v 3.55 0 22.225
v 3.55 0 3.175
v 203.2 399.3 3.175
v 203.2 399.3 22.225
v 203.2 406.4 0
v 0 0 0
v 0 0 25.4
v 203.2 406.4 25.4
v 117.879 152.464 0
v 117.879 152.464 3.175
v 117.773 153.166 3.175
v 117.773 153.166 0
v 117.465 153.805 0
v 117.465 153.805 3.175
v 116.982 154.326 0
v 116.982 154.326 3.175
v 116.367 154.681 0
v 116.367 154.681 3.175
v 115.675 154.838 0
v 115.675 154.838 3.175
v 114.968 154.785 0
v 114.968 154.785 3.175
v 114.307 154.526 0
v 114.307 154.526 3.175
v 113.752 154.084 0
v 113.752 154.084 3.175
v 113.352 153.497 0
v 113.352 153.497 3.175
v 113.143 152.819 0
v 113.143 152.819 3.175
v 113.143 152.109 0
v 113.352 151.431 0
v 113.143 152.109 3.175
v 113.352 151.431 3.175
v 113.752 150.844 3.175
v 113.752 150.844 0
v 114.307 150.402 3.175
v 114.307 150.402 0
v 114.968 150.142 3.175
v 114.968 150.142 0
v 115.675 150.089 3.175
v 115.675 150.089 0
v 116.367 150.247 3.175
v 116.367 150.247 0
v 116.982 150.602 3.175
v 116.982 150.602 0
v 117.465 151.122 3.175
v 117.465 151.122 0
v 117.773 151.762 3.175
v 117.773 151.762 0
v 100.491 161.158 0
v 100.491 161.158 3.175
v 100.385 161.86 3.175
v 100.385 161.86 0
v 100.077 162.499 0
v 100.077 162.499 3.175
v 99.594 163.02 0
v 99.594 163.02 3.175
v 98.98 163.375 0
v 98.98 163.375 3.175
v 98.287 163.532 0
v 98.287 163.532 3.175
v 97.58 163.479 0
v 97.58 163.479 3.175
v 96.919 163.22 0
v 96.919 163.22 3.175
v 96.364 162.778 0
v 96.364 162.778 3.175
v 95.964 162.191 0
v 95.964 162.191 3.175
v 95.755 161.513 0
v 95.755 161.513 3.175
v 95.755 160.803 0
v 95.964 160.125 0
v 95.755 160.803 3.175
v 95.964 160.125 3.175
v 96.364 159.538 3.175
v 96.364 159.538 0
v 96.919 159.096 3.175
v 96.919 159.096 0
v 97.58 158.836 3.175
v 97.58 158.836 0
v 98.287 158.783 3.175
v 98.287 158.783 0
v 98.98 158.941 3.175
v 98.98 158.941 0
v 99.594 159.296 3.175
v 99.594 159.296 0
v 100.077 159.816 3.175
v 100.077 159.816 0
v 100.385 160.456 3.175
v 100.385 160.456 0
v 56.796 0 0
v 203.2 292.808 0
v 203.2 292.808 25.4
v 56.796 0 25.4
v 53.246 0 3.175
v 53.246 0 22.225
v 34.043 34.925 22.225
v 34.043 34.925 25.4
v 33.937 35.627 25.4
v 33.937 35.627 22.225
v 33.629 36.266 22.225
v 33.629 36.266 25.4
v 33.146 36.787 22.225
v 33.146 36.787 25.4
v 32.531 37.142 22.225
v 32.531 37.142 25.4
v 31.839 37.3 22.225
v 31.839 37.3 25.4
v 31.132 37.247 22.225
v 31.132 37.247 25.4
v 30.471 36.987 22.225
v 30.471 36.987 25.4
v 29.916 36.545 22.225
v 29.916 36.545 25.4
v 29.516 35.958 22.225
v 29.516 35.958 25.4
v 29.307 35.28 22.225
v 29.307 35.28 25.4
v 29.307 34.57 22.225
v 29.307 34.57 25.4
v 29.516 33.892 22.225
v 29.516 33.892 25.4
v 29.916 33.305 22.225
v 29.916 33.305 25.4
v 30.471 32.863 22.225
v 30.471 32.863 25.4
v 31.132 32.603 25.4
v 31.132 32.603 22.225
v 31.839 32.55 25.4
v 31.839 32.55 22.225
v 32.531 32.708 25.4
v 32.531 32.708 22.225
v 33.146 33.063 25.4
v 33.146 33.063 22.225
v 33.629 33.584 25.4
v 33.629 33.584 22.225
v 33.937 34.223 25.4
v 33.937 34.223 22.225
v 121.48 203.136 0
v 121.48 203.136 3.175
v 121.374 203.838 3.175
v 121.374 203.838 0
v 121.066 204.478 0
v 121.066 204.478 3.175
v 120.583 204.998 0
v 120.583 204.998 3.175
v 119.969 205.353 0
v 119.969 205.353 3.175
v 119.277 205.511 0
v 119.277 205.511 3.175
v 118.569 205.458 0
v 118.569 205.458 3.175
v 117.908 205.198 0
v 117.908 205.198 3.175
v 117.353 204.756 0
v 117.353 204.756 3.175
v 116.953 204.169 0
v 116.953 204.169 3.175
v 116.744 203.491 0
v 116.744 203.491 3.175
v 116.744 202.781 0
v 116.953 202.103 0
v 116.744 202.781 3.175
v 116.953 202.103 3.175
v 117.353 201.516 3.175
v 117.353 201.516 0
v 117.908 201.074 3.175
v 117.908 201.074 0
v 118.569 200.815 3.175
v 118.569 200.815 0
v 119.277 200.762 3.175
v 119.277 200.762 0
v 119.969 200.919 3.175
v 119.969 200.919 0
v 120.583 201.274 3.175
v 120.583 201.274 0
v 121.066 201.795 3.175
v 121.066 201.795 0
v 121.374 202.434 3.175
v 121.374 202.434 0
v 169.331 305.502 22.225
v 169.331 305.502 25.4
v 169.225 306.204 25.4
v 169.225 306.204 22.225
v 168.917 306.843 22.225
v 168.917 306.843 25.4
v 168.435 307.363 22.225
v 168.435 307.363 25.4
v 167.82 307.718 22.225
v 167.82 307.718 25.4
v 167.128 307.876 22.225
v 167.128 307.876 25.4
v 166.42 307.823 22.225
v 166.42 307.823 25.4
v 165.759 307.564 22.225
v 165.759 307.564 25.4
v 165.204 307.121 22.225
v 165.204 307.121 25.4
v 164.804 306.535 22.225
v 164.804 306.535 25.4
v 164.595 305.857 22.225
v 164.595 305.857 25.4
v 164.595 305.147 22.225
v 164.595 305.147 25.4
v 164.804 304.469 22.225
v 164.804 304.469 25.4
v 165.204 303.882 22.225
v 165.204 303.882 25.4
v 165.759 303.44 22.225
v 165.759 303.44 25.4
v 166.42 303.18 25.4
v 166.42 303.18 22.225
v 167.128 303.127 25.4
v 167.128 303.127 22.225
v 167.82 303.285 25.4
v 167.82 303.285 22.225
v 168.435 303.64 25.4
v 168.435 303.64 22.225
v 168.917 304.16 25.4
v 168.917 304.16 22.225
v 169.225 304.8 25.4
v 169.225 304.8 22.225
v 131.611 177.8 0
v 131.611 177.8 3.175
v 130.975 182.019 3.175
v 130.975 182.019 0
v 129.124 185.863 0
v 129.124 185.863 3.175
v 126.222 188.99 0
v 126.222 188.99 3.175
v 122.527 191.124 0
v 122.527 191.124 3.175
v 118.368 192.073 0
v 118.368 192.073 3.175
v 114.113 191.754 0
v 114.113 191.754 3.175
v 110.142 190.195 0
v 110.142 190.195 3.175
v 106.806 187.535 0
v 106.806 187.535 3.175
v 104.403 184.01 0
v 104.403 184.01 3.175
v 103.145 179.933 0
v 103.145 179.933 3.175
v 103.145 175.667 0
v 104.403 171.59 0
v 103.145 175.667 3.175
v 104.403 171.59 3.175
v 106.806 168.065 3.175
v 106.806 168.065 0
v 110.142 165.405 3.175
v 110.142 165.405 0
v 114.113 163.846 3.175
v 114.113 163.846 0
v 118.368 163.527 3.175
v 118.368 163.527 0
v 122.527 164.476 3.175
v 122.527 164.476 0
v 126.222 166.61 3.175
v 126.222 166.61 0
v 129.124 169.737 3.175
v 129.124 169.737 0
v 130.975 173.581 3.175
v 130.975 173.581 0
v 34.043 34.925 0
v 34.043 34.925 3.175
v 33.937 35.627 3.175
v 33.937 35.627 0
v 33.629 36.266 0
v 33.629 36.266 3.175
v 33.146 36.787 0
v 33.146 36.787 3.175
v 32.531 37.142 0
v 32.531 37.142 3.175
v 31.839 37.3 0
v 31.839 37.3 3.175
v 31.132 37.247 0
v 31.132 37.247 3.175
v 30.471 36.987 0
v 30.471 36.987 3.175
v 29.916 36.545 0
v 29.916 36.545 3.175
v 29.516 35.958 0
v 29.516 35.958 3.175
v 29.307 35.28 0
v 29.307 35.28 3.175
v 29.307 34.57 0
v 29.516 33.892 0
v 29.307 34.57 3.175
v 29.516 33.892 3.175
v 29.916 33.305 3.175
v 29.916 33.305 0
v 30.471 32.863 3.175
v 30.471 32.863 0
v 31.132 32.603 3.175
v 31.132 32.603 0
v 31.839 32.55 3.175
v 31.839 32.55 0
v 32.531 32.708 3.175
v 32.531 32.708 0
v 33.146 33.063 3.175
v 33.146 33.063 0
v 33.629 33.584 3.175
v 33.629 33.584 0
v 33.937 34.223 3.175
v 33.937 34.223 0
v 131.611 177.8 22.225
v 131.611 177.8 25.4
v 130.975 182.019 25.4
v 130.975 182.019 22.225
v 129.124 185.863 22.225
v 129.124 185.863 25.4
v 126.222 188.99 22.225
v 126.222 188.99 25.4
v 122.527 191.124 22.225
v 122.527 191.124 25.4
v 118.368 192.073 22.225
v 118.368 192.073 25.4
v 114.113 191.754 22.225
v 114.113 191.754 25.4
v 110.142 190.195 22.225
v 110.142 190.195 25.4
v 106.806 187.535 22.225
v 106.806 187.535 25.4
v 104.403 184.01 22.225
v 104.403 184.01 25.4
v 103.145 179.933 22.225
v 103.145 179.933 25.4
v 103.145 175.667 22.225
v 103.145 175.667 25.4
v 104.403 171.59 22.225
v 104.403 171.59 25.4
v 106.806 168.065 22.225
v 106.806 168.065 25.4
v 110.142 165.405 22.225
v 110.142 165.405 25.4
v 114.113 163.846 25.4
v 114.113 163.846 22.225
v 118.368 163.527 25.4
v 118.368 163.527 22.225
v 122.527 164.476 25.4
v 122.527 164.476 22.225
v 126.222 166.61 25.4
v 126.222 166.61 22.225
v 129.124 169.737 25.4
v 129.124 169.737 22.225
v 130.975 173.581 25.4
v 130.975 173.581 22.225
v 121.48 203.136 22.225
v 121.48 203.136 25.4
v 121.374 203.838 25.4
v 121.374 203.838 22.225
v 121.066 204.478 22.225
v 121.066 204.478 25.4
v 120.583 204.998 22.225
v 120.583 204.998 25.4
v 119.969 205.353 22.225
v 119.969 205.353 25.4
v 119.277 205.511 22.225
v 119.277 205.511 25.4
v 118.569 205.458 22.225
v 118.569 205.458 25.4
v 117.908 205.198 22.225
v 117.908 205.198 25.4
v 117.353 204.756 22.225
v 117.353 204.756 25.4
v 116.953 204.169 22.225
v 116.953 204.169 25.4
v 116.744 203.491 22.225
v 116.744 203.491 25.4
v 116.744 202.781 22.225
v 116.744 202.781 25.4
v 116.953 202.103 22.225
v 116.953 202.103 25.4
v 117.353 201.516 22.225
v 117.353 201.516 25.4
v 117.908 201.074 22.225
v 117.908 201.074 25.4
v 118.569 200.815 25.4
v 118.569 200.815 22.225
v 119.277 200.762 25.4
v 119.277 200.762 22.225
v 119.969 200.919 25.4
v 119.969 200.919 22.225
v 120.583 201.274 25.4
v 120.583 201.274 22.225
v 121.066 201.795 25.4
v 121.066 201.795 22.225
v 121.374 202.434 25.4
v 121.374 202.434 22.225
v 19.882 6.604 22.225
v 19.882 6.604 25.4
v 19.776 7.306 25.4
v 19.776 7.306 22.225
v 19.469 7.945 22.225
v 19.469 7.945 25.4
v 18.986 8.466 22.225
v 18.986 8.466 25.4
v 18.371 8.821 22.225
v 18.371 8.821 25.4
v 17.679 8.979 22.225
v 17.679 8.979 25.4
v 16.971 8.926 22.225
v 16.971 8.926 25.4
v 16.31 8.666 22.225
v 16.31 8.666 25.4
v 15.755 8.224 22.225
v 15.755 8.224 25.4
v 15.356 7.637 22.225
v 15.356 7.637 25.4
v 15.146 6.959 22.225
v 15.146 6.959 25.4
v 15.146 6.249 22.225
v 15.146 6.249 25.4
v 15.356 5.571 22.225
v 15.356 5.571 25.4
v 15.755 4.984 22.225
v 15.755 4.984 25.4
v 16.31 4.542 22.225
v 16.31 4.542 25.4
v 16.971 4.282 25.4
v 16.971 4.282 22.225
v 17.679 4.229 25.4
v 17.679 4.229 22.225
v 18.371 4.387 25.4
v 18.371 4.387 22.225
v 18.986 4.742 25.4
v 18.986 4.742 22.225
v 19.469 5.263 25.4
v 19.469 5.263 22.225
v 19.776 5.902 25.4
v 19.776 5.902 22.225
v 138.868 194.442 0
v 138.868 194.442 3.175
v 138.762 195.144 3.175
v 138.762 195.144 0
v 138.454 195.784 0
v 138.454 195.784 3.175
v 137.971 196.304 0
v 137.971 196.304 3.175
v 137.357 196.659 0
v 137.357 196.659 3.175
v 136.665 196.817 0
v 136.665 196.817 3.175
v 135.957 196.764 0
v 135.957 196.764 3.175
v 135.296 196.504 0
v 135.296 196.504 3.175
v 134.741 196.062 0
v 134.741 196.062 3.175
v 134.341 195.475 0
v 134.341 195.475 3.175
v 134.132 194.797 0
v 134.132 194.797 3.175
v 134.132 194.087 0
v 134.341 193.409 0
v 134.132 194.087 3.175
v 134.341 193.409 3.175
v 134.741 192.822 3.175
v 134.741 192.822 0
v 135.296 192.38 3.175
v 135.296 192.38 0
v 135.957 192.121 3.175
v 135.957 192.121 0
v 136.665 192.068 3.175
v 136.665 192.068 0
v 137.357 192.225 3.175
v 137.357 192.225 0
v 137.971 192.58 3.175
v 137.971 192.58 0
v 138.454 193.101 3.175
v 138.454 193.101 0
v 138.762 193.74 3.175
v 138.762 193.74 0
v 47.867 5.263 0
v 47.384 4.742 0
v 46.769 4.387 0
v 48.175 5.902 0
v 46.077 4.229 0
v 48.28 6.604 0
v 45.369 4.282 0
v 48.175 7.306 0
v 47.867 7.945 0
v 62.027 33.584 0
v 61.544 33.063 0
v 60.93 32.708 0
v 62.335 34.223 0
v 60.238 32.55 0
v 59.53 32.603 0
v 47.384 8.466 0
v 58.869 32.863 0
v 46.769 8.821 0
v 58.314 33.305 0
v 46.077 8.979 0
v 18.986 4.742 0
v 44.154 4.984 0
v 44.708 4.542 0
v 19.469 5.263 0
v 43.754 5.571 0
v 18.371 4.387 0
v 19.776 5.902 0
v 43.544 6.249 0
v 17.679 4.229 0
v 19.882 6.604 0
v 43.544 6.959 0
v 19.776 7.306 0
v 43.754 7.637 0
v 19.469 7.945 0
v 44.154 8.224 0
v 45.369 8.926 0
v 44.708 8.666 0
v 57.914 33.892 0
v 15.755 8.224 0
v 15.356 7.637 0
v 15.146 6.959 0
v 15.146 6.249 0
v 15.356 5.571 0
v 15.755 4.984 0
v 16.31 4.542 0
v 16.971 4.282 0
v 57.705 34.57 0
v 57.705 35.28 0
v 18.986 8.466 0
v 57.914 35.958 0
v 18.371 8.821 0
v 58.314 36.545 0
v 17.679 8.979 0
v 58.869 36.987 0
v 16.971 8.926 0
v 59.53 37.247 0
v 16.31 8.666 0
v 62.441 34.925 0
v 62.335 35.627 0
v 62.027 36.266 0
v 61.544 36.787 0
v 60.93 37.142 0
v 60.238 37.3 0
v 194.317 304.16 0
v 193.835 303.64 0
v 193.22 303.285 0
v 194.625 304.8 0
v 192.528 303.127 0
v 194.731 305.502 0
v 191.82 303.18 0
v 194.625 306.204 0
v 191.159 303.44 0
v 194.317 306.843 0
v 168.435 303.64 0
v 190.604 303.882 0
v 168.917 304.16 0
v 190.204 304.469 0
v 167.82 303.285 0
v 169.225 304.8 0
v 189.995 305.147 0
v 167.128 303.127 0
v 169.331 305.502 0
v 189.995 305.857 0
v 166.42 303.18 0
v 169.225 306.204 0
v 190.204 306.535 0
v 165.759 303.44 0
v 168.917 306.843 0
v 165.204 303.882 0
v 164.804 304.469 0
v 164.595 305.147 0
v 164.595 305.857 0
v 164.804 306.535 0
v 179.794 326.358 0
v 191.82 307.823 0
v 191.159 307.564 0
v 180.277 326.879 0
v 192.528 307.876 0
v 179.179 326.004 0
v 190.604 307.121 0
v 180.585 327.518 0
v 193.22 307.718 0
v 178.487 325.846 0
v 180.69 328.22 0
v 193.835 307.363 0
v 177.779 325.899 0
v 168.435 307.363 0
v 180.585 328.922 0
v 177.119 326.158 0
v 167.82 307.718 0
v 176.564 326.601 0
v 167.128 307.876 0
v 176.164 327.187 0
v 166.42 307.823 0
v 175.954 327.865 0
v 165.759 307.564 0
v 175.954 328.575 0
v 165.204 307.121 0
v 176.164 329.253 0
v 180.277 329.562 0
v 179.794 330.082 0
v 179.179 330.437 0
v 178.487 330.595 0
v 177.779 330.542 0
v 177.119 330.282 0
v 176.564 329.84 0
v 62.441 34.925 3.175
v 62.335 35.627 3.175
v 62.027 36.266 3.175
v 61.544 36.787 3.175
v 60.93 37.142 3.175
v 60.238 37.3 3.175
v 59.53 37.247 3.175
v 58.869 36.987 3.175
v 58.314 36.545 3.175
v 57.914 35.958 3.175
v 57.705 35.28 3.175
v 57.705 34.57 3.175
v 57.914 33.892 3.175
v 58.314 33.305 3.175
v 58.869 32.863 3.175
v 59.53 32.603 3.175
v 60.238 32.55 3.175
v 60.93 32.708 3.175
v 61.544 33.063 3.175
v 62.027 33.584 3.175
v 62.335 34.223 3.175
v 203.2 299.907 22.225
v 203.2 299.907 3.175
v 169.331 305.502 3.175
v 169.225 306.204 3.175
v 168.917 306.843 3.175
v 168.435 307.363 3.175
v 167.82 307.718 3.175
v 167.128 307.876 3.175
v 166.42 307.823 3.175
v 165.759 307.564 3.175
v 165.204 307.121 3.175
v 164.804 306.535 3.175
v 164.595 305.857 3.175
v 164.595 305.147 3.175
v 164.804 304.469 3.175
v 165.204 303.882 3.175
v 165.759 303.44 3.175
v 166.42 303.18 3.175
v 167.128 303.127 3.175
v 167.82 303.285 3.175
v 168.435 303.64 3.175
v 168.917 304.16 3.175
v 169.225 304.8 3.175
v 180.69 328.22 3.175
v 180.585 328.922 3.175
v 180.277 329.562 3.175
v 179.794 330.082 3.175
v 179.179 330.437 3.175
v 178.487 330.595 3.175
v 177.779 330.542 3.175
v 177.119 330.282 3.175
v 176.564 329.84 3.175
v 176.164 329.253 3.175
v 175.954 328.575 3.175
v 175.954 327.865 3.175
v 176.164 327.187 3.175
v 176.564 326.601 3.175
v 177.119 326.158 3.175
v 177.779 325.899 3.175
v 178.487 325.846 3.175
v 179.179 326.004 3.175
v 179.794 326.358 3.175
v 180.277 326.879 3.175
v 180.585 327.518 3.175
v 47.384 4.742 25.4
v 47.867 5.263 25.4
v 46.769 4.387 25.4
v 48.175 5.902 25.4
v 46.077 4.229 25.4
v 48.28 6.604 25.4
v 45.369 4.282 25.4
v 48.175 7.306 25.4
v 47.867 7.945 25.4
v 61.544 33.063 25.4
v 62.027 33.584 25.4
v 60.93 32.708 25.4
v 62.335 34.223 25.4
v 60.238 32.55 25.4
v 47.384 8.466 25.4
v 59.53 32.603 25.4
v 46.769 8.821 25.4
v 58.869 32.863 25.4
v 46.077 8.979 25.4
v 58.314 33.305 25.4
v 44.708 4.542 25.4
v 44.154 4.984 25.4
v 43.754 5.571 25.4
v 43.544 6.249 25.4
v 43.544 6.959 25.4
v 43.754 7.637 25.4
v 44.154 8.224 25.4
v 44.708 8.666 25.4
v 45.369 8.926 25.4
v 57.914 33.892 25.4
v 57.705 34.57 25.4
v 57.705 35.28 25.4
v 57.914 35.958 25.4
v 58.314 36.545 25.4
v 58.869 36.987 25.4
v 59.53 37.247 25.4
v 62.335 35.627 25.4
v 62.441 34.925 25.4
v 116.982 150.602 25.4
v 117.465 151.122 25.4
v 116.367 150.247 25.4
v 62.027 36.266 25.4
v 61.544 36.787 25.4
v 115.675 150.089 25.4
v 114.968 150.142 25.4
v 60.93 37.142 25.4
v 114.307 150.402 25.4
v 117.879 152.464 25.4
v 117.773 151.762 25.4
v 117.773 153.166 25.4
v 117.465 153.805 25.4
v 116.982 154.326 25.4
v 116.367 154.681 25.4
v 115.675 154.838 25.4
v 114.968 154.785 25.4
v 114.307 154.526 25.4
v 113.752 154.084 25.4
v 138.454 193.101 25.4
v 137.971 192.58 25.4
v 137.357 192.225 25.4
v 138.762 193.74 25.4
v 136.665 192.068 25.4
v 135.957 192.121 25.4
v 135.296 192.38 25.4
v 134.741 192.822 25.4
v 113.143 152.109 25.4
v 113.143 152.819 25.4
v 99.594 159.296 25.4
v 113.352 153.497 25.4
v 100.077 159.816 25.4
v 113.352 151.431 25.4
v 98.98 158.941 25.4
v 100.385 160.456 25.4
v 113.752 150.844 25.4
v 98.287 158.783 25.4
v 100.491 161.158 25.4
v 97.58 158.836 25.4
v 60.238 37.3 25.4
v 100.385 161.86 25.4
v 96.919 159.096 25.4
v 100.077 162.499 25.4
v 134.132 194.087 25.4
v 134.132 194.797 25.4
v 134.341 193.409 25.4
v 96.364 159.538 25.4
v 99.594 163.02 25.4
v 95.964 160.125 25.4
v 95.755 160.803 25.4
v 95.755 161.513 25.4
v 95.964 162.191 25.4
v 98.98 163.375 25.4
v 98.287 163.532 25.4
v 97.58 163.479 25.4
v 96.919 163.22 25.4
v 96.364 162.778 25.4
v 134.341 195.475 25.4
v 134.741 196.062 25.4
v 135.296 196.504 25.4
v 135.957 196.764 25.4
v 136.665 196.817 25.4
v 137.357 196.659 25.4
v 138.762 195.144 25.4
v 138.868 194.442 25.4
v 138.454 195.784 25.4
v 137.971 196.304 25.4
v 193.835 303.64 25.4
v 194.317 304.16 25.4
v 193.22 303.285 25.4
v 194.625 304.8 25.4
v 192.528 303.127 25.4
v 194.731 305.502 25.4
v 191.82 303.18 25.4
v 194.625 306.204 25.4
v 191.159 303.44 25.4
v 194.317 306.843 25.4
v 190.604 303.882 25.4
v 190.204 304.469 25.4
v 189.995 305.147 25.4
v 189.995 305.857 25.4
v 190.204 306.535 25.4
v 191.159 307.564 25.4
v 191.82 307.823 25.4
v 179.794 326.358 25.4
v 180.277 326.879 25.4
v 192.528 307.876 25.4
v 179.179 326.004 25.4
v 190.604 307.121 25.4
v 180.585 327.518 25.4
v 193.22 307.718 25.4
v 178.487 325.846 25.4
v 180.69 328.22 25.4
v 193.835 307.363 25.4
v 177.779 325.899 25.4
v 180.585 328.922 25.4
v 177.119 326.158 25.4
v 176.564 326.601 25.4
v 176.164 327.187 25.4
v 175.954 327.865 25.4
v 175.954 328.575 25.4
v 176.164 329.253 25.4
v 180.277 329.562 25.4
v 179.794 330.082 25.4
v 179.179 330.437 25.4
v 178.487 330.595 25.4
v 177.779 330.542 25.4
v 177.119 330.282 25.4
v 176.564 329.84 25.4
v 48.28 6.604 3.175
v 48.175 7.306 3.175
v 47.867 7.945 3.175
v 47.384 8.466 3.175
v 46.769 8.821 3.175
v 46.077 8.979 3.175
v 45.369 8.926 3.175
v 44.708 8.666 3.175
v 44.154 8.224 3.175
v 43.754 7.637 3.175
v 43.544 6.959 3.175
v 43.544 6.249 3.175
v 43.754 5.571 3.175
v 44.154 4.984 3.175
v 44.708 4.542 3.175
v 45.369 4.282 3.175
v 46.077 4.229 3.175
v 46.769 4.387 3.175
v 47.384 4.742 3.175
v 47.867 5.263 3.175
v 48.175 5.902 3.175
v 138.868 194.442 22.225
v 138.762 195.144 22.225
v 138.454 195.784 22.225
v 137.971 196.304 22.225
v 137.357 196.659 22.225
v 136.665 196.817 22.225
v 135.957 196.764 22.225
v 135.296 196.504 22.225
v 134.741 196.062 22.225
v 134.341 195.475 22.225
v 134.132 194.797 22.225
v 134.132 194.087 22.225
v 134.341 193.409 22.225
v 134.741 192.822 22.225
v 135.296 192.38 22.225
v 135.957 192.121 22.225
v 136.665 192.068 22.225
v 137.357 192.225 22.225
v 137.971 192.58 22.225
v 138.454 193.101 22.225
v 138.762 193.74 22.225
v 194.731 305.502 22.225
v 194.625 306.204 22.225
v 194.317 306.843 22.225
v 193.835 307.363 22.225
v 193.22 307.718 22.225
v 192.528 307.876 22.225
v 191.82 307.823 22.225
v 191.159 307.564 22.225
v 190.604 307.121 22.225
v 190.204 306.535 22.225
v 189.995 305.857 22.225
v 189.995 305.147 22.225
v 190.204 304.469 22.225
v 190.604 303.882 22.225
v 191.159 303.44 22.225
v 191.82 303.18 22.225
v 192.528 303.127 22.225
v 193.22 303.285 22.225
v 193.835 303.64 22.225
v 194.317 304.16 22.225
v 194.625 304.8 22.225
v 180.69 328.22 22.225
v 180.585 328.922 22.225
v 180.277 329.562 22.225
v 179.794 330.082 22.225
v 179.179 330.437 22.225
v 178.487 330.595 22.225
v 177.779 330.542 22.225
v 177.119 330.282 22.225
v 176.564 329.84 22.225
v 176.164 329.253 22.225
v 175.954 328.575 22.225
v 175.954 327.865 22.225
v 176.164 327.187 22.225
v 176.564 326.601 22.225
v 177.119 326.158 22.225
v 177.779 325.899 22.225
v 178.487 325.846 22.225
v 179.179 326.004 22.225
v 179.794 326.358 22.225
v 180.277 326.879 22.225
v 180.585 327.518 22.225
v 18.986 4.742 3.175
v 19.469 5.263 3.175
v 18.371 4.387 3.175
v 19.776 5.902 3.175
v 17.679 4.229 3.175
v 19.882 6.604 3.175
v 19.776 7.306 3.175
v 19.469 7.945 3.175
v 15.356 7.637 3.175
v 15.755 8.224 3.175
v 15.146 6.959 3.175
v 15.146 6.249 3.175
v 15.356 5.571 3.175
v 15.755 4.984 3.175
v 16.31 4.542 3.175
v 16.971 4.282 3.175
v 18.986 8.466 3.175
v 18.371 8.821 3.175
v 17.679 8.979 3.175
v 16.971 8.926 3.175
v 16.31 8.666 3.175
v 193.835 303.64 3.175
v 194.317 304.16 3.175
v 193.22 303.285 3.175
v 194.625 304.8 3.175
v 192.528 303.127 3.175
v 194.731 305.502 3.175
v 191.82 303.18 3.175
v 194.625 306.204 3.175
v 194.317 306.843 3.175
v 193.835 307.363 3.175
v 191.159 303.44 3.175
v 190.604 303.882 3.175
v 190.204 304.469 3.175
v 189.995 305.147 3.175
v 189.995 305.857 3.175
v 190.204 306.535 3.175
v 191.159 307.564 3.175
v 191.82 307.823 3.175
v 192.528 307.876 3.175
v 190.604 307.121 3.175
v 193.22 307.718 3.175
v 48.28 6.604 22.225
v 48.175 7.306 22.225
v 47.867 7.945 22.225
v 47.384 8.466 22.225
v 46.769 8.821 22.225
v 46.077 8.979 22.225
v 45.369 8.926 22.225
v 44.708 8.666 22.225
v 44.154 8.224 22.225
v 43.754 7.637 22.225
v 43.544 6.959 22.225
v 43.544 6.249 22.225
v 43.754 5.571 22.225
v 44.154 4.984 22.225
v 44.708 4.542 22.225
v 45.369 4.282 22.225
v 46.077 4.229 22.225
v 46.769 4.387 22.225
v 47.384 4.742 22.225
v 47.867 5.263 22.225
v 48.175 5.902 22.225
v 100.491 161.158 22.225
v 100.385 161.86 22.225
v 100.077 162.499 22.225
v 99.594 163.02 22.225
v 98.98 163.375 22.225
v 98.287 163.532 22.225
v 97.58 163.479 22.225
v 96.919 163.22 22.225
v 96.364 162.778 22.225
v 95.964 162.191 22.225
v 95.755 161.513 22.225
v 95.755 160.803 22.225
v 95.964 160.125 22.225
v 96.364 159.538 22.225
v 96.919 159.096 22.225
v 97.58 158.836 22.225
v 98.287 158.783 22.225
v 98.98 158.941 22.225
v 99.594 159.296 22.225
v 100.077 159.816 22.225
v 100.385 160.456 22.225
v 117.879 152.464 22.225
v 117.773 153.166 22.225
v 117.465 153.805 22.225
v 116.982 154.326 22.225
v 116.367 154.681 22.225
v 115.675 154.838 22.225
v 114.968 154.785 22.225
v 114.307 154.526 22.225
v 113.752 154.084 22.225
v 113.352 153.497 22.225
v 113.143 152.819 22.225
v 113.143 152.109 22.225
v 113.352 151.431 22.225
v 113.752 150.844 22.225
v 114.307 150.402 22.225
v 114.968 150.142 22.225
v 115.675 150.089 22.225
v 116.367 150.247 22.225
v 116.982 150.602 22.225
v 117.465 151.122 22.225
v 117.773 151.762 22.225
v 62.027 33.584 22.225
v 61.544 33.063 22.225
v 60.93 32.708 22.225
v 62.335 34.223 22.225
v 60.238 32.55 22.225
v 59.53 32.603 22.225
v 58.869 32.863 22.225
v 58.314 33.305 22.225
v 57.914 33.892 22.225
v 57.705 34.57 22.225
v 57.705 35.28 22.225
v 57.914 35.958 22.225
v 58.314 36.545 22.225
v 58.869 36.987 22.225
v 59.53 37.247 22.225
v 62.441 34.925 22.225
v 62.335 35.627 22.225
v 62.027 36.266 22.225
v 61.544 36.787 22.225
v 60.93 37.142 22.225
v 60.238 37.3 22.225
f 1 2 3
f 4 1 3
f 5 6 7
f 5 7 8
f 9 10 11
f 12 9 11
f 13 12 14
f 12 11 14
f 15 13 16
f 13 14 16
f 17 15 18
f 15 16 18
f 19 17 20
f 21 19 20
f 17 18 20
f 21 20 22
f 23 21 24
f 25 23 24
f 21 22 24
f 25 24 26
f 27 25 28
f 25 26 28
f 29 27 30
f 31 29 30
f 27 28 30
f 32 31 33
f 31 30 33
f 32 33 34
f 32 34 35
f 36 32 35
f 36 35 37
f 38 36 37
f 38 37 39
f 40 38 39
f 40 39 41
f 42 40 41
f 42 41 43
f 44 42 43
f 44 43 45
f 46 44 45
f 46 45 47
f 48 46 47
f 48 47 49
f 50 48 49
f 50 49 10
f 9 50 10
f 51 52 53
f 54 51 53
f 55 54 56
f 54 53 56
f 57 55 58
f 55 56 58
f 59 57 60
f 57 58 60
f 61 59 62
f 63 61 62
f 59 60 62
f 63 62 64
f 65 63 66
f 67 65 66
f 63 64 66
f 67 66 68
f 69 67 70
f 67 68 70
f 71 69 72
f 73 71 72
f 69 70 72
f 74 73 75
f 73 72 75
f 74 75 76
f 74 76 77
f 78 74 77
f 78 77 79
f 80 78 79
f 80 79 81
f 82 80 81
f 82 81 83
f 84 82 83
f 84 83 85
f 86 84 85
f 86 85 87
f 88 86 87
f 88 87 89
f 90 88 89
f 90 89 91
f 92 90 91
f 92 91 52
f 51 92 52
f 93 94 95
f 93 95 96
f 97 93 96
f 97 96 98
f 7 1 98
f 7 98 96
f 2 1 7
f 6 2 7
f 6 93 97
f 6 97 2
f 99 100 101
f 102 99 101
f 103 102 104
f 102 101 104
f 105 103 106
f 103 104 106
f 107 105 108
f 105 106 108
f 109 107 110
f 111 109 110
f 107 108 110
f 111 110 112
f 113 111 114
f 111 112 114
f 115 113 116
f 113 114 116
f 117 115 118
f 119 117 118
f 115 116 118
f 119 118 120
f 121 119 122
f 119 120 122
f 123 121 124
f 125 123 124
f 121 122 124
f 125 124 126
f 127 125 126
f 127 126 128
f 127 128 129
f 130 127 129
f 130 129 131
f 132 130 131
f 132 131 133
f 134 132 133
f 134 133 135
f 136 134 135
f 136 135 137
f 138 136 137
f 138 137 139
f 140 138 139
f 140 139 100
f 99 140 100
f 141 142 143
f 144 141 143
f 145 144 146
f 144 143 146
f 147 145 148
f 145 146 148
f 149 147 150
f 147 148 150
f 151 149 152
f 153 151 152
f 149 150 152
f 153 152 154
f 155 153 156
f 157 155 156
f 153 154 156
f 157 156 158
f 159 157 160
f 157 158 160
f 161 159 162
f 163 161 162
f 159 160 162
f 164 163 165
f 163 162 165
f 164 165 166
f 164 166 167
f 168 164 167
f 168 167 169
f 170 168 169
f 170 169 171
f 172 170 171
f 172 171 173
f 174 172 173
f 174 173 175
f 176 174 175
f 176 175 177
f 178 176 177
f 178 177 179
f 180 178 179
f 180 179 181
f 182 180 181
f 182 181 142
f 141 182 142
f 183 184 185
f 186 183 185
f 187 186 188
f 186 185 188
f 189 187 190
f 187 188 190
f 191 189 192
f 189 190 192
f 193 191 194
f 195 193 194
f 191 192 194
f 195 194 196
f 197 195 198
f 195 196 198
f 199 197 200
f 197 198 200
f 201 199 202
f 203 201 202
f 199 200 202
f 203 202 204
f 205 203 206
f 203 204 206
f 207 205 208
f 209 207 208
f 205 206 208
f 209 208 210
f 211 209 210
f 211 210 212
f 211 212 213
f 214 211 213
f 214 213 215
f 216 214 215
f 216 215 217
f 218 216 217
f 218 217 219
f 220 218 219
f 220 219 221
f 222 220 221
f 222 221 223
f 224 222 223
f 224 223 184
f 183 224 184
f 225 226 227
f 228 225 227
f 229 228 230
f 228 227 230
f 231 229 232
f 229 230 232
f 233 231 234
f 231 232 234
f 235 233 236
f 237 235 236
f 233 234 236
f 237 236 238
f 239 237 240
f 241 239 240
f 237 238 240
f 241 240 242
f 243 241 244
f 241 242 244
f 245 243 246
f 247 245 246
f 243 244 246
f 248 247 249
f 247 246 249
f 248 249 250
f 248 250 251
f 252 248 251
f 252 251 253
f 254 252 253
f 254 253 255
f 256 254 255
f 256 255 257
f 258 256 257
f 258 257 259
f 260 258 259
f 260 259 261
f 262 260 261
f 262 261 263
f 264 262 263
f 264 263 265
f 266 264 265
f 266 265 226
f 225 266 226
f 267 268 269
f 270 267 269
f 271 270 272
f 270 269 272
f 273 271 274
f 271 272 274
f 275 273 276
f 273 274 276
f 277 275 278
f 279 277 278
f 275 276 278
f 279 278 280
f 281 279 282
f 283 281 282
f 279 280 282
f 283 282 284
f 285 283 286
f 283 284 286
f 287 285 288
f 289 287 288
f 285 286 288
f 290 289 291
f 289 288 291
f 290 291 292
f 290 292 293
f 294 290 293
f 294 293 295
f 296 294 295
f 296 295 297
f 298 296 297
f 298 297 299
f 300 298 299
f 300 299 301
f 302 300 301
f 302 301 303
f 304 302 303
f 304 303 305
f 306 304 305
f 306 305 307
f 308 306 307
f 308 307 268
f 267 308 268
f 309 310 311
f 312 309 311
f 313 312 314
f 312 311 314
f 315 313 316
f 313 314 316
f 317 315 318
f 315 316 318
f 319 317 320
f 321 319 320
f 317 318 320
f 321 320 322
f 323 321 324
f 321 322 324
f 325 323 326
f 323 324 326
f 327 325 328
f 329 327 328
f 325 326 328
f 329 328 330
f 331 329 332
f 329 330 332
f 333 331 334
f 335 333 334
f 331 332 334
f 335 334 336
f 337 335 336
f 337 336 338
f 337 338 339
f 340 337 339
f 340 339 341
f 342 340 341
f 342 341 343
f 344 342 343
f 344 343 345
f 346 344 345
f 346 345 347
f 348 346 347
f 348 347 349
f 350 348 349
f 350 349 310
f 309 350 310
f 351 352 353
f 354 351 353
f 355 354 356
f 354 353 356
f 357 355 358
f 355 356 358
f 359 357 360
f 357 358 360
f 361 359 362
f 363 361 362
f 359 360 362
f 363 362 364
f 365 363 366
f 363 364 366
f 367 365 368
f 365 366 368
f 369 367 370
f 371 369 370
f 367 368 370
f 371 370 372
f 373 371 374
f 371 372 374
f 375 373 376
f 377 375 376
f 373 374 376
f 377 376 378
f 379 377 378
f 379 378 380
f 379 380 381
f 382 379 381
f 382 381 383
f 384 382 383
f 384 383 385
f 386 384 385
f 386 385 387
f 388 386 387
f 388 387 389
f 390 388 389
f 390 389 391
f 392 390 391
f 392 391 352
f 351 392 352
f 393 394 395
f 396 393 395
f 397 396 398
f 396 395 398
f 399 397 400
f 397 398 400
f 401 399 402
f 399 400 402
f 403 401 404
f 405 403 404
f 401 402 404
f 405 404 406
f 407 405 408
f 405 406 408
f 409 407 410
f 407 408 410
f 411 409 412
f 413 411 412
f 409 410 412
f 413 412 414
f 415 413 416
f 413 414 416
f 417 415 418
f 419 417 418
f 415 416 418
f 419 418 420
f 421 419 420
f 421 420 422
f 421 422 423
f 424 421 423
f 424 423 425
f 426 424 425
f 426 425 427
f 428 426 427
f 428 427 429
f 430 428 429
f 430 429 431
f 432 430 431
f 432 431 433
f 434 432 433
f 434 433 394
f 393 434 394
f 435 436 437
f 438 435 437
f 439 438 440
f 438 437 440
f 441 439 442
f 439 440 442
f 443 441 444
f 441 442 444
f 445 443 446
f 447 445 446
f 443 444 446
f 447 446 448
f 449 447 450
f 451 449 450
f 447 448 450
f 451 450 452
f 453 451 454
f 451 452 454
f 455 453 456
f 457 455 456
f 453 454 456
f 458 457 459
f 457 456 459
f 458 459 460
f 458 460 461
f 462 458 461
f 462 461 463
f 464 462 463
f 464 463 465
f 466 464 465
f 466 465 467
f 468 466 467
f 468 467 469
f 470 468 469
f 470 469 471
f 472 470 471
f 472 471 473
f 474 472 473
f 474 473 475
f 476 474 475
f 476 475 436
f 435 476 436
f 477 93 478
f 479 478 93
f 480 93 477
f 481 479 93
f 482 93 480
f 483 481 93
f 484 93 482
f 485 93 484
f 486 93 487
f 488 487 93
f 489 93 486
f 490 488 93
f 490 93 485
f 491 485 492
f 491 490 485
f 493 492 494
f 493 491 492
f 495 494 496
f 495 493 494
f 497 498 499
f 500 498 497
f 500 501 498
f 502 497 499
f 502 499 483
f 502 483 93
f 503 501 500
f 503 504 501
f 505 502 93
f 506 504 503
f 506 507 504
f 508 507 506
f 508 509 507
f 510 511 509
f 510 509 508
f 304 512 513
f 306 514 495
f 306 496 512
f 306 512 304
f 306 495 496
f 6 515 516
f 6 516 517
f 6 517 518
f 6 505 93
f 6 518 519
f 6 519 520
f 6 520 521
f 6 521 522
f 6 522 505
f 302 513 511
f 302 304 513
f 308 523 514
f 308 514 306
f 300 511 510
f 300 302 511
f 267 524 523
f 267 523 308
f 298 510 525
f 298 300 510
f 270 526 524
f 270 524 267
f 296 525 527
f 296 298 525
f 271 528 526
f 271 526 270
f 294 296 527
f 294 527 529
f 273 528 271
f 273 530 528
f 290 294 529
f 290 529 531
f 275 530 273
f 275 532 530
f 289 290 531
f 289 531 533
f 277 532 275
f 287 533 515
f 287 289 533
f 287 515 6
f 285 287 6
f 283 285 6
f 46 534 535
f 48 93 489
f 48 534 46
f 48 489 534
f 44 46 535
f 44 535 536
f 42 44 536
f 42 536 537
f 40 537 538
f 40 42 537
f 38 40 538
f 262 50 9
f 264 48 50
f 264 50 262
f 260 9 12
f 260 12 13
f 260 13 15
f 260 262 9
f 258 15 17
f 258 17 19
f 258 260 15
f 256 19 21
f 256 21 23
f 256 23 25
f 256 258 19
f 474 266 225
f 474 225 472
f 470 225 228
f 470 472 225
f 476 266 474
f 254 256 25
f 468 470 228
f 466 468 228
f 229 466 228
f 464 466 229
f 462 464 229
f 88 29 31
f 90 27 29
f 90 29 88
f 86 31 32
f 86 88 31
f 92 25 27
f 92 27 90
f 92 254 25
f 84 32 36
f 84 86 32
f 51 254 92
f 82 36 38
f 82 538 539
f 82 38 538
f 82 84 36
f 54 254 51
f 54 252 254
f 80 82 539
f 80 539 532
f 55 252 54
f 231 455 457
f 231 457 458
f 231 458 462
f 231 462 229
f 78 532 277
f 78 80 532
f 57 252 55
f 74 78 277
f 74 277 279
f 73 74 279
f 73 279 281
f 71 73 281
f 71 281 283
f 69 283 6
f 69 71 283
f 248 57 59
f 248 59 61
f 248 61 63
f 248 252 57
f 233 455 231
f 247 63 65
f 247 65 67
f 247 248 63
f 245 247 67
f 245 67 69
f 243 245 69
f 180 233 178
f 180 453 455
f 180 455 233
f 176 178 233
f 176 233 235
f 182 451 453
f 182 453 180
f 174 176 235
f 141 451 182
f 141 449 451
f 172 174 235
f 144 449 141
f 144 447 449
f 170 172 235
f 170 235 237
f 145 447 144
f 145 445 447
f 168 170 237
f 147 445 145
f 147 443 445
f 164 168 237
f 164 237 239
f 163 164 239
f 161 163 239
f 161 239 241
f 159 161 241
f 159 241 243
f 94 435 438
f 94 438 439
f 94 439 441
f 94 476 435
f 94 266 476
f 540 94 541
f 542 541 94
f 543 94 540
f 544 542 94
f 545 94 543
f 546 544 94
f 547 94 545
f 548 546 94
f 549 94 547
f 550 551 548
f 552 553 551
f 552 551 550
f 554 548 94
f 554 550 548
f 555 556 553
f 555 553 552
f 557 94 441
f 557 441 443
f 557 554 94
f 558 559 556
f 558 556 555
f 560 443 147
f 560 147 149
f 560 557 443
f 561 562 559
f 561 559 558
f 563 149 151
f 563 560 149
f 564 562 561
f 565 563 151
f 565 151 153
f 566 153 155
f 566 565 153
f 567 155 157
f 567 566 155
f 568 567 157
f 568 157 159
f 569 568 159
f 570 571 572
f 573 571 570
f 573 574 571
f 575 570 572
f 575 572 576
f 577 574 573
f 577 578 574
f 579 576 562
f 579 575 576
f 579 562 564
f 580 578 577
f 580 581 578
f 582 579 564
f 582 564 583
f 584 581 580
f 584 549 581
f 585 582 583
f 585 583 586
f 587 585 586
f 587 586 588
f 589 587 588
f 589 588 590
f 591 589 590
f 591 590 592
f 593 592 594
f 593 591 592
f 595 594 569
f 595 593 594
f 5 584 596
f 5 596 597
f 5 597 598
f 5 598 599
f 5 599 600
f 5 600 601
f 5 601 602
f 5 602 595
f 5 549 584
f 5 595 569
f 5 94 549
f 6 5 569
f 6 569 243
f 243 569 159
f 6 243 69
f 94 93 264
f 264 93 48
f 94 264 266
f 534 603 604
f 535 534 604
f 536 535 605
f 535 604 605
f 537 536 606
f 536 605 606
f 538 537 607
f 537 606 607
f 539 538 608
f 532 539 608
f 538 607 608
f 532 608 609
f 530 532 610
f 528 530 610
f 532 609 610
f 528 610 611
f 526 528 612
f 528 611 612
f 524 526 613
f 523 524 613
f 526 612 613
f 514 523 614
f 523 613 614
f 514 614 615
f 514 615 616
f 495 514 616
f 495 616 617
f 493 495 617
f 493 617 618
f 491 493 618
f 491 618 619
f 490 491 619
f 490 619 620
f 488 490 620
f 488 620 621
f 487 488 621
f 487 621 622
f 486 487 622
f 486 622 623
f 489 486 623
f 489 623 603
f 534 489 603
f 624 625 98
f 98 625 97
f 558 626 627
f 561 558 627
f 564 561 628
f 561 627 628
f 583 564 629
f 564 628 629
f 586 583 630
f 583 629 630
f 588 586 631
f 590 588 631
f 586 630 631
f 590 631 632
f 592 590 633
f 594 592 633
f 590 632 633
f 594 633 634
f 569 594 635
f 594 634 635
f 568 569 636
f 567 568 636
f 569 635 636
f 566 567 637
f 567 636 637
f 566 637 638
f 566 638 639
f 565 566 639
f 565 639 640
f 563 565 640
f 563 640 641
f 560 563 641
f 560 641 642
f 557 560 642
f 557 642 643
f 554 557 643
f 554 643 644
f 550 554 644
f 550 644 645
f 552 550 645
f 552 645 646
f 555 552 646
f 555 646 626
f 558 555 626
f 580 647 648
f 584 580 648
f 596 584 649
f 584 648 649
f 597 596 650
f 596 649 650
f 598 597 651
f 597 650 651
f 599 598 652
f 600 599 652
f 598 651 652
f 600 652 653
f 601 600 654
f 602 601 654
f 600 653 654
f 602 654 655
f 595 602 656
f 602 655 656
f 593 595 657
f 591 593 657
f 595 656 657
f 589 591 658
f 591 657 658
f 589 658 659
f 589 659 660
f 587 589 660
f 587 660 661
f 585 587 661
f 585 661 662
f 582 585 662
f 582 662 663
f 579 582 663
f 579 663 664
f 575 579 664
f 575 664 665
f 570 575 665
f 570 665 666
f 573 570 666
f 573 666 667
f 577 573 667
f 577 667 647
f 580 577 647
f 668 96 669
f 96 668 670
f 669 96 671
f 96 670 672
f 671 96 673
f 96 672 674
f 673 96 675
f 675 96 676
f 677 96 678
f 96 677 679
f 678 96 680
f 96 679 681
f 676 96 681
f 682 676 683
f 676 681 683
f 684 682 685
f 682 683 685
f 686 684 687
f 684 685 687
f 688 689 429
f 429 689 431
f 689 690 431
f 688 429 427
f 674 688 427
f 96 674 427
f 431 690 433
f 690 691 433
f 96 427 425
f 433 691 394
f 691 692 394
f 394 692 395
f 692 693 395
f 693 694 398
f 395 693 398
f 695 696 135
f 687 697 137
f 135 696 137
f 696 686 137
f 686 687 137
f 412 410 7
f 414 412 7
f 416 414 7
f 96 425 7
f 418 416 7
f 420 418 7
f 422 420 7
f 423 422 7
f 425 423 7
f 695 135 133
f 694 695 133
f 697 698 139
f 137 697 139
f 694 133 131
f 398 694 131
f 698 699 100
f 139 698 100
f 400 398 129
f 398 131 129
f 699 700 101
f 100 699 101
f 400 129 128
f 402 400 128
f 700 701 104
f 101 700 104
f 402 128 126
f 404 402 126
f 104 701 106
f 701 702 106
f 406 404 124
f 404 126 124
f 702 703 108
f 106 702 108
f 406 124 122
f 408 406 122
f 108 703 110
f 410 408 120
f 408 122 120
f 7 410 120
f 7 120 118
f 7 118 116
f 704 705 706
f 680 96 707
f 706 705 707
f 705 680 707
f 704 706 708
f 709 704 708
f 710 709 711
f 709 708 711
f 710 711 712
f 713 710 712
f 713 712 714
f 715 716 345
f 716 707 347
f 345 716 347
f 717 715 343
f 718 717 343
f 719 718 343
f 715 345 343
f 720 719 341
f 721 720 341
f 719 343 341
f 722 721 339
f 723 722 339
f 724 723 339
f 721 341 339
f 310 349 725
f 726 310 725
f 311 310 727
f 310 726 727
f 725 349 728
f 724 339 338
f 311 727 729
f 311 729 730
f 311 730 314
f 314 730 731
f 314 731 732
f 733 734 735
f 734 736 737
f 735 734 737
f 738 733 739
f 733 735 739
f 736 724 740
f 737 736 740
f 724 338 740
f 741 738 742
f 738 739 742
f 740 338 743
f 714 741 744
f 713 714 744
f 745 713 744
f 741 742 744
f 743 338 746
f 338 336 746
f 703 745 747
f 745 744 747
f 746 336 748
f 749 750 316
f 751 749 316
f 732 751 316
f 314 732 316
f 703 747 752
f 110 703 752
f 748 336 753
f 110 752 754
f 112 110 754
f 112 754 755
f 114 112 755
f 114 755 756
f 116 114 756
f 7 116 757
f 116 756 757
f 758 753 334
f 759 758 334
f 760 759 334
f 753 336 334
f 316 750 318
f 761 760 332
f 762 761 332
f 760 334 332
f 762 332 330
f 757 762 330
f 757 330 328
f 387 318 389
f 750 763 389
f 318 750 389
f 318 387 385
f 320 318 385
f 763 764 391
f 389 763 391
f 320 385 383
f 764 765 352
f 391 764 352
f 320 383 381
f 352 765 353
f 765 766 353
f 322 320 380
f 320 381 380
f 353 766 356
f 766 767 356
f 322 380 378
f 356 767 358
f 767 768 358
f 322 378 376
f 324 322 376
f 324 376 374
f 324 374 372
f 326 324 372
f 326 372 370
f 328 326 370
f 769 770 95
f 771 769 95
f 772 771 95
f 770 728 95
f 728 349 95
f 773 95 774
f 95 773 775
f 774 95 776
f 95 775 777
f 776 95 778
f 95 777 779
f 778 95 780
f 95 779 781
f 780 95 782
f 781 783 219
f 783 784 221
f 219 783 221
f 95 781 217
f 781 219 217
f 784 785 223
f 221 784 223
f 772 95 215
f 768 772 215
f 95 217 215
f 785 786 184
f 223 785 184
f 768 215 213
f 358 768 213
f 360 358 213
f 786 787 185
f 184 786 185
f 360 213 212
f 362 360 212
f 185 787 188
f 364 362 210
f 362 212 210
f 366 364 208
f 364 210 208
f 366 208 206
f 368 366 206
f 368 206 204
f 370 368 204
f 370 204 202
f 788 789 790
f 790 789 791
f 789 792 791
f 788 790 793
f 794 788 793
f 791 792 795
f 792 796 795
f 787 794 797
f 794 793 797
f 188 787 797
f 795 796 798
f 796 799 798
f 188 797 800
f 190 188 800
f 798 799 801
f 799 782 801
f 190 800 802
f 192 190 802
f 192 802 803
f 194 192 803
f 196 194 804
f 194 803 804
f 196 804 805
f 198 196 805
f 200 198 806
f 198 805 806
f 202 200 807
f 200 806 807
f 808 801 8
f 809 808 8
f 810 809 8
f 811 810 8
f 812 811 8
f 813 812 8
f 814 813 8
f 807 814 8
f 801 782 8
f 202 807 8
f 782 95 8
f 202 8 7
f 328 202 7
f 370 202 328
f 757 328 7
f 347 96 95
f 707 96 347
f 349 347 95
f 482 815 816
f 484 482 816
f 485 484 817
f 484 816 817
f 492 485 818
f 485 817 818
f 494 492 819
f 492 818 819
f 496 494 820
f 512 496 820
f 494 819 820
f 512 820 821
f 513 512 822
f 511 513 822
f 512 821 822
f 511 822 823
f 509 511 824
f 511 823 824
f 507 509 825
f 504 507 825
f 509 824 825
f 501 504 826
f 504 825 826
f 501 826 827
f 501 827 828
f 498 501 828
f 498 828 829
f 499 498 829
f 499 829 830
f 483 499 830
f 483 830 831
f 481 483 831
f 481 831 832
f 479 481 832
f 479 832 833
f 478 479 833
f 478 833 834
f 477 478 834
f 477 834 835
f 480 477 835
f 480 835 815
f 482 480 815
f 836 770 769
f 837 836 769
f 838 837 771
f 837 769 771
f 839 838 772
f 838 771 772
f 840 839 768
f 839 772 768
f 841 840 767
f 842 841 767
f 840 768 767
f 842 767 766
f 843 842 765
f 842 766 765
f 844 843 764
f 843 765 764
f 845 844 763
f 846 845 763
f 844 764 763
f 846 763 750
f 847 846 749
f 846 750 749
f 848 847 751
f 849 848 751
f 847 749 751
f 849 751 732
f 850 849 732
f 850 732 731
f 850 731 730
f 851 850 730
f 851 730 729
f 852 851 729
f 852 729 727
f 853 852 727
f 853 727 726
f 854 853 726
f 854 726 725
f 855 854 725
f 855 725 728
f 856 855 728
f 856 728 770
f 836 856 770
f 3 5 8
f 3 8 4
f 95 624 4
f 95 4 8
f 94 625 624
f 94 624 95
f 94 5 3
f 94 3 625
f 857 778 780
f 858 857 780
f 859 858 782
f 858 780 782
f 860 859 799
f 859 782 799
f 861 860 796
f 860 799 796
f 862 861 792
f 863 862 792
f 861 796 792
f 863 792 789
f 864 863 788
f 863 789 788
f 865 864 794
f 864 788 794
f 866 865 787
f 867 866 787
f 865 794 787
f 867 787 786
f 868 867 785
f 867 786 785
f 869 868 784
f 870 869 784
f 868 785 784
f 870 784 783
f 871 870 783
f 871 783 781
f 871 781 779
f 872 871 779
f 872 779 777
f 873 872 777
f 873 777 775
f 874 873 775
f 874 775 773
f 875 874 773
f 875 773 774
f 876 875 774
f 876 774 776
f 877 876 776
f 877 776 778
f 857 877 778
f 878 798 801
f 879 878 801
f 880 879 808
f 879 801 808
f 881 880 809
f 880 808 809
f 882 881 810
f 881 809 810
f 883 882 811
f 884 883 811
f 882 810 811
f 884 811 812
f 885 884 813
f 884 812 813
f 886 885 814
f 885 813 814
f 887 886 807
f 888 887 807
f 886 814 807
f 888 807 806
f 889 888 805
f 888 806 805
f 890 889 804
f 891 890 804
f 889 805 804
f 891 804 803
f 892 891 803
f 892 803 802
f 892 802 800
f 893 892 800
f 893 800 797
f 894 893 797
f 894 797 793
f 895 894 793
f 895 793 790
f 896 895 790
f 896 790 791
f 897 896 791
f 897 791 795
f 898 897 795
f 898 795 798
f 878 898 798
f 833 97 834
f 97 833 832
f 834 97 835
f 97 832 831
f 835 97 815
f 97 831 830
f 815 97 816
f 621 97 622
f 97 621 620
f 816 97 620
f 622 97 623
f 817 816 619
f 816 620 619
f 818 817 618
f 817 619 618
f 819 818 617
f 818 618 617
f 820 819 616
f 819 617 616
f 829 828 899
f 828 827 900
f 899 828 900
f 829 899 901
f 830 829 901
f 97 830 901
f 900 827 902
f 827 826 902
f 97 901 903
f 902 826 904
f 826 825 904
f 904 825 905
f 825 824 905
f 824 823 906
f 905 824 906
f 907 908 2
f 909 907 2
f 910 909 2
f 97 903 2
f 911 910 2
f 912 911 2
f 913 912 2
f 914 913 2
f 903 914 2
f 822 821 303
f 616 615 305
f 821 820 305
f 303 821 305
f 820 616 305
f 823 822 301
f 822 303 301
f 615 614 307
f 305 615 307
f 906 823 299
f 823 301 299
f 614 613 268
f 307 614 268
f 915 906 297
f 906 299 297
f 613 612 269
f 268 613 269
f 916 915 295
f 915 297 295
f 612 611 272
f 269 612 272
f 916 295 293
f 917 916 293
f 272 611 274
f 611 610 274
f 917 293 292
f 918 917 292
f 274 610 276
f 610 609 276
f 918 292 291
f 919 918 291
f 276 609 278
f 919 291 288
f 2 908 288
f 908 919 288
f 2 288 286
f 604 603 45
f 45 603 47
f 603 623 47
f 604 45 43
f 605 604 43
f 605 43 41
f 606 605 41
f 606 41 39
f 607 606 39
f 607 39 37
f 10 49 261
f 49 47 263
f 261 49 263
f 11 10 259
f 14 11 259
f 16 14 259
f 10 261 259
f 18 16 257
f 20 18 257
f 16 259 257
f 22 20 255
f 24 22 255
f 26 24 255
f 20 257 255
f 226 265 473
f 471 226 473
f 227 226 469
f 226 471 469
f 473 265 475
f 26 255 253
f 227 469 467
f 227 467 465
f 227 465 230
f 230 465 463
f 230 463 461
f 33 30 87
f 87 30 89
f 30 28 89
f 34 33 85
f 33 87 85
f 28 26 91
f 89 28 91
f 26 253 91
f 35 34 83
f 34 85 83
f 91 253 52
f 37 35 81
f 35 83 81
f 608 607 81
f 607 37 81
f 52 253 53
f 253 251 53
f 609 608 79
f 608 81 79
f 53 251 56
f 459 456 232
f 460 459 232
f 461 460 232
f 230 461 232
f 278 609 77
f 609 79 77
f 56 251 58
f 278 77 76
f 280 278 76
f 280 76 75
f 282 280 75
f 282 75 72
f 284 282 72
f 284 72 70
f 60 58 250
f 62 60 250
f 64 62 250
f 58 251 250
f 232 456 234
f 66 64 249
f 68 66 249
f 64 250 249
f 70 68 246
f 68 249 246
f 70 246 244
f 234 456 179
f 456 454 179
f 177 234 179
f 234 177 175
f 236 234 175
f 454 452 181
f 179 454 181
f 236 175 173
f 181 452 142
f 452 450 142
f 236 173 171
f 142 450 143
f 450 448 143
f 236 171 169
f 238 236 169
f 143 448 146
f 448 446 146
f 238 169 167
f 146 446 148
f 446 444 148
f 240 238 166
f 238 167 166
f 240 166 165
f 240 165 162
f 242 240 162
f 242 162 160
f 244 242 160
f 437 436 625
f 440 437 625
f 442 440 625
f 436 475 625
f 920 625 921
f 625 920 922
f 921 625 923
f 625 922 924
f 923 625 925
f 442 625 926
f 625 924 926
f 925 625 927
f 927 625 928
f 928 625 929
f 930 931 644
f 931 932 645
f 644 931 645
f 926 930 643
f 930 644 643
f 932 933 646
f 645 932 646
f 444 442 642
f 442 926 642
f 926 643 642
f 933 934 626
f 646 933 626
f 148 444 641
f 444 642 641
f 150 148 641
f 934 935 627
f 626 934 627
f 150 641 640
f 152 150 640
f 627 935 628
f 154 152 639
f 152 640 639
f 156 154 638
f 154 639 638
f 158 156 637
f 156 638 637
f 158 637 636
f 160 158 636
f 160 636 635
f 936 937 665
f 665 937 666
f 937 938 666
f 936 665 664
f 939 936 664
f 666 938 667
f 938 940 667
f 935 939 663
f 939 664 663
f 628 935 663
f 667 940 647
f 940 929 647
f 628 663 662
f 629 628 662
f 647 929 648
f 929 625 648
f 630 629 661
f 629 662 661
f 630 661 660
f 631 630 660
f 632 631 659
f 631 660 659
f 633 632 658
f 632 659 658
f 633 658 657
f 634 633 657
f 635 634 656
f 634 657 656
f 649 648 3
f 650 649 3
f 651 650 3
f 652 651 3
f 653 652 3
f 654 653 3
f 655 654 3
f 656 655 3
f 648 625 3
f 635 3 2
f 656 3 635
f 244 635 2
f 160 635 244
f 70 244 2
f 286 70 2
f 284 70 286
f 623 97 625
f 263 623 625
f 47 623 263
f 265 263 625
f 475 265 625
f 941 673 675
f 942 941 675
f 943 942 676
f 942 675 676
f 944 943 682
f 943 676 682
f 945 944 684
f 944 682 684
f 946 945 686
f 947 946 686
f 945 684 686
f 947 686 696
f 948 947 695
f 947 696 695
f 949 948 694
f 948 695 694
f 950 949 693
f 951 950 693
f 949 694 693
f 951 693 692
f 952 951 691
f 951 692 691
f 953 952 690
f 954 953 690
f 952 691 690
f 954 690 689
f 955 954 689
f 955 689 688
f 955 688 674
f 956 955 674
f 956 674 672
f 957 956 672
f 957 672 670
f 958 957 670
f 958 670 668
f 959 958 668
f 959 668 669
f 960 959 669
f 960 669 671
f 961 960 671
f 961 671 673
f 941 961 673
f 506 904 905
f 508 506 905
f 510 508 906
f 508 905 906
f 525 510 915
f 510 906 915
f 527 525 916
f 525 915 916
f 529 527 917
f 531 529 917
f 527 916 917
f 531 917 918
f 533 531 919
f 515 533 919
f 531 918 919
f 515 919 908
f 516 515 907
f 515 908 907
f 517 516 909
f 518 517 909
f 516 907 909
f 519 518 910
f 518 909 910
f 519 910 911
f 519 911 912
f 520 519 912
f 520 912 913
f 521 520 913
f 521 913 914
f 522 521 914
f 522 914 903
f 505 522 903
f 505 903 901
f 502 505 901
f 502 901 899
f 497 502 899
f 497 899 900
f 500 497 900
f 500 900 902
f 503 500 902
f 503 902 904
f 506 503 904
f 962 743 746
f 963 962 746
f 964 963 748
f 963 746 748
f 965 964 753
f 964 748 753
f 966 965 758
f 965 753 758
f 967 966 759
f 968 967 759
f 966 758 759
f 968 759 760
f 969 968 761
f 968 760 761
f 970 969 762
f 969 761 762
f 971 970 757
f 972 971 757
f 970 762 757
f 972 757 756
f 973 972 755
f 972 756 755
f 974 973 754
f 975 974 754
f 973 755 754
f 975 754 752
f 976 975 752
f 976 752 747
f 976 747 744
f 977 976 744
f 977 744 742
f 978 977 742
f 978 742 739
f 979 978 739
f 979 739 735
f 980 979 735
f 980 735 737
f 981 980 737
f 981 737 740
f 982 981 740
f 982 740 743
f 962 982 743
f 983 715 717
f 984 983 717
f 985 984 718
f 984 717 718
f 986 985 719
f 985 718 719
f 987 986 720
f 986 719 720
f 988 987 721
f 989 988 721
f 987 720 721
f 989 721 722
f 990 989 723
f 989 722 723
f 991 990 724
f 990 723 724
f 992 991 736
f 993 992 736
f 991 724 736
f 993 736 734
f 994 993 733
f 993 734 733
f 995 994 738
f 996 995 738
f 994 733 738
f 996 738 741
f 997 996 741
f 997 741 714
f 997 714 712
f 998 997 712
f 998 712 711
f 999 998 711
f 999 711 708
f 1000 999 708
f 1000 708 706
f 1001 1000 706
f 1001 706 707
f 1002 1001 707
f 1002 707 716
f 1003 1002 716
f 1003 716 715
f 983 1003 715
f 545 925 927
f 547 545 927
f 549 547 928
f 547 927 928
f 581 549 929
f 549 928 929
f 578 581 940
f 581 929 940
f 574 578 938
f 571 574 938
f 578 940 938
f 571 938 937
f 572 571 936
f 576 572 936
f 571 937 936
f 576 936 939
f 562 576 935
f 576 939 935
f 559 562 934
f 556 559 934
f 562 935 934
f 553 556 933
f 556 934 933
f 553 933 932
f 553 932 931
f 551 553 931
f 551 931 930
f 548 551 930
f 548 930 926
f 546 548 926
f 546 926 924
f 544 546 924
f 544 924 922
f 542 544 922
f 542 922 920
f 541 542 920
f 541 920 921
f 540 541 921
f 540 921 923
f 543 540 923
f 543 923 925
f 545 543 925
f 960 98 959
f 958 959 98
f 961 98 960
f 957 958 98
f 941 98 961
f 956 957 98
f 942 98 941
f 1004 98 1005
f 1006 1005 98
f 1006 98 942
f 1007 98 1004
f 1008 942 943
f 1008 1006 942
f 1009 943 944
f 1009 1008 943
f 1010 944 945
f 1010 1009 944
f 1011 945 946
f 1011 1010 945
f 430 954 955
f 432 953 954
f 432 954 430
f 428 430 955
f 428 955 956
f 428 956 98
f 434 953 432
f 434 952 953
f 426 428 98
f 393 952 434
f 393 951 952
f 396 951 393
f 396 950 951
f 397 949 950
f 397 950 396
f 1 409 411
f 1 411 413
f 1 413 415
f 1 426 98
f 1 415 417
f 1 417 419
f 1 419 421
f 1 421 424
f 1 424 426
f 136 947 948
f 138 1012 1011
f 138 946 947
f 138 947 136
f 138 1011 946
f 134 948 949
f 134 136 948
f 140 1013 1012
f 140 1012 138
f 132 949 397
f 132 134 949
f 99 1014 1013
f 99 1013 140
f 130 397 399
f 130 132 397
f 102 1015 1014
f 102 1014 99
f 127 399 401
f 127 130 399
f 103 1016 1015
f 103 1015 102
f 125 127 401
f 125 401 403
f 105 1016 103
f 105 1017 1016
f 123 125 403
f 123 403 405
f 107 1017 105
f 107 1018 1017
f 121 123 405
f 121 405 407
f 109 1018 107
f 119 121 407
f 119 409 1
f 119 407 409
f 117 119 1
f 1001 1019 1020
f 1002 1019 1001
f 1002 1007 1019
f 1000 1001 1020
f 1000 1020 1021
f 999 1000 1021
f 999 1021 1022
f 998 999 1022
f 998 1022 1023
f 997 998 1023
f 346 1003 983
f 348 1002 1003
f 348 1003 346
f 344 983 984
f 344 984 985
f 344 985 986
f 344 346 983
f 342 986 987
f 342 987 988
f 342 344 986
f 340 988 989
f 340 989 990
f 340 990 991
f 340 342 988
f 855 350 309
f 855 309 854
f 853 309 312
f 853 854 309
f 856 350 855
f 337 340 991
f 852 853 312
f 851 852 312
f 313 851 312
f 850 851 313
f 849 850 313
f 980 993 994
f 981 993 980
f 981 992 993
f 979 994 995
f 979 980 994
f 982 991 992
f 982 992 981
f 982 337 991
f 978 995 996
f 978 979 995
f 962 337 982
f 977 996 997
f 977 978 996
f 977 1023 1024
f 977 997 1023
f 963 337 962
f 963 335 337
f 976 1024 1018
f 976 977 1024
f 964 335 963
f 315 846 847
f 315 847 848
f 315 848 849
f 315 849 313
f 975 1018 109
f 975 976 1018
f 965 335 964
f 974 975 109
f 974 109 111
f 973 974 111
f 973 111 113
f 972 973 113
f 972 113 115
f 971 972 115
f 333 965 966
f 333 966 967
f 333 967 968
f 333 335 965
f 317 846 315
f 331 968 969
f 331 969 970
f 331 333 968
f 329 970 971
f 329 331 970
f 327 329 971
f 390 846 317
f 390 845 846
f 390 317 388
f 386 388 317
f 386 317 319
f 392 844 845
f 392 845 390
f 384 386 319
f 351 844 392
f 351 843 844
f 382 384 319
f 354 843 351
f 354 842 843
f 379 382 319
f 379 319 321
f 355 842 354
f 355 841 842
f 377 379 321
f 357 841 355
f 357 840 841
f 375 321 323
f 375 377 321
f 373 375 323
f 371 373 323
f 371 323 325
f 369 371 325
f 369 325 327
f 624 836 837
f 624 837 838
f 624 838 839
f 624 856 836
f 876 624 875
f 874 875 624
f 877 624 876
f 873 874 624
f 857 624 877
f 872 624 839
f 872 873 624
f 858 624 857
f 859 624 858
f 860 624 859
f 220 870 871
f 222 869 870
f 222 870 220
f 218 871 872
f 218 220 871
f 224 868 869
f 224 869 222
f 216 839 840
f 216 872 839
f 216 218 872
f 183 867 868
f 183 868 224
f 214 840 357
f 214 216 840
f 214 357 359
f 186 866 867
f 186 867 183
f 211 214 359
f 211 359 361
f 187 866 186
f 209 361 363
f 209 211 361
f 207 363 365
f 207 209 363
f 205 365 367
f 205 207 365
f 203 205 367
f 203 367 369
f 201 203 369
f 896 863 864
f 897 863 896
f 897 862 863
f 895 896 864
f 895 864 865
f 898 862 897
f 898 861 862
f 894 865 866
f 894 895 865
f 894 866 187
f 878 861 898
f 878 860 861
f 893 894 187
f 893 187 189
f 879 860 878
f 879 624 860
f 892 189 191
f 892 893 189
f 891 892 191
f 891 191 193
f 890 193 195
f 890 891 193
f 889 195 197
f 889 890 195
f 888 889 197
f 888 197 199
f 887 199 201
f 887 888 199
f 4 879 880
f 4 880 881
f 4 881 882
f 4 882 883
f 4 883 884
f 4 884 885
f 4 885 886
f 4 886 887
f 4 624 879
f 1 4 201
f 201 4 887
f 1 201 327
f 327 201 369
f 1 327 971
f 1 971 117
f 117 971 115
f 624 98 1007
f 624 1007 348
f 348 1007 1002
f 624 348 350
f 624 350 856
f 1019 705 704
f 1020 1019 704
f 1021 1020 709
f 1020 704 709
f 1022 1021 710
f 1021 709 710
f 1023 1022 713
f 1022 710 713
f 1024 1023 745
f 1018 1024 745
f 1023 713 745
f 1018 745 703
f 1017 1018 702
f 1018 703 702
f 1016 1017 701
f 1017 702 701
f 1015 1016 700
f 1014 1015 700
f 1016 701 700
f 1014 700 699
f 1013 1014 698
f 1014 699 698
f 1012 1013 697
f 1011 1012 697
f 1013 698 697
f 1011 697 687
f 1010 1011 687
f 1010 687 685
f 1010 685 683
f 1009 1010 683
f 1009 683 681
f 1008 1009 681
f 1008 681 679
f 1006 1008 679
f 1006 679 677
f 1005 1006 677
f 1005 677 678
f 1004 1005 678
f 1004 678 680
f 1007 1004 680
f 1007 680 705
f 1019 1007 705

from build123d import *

# Parameters (mm, degrees)
BOSS_EXTRUDE1_DEPTH = 25.4
SHELL1_T            = -3.175
SKETCH2_R           = 14.3129
CUT_EXTRUDE1_DEPTH  = 456.078410826
SKETCH3_R           = 2.38125
CUT_EXTRUDE2_DEPTH  = 456.078410826
SKETCH4_R           = 2.38125
CUT_EXTRUDE3_DEPTH  = 456.078410826


with BuildPart() as part:
    # Sketch1 → Boss-Extrude1 (new body)
    with BuildSketch(Plane.XY):
        Polygon((0, 0), (203.2, 406.4), (203.2, 292.807746743), (56.796126628, 0), align=None)
    extrude(amount=BOSS_EXTRUDE1_DEPTH)

    # Shell1
    shell1_openings = [part.faces().sort_by_distance(p)[0] for p in [
        (203.2, 349.603873372, 12.7),
        (28.398063314, 0, 12.7),
    ]]
    offset(amount=SHELL1_T, openings=shell1_openings, kind=Kind.INTERSECTION)

    # Sketch2 → Cut-Extrude1 (cut, through all)
    with BuildSketch(Plane.XY.offset(25.4)):
        with Locations((117.298063314, 177.8)):
            Circle(SKETCH2_R)
    extrude(amount=-CUT_EXTRUDE1_DEPTH, mode=Mode.SUBTRACT)

    # Sketch3 → Cut-Extrude2 (cut, through all)
    with BuildSketch(Plane.XY.offset(25.4)):
        with Locations((119.098644425, 203.136098904)):
            Circle(SKETCH3_R)
        with Locations((136.486593771, 194.442124231)):
            Circle(SKETCH3_R)
        with Locations((98.109532857, 161.157875769)):
            Circle(SKETCH3_R)
        with Locations((115.497482204, 152.463901096)):
            Circle(SKETCH3_R)
    extrude(amount=-CUT_EXTRUDE2_DEPTH, mode=Mode.SUBTRACT)

    # Sketch4 → Cut-Extrude3 (cut, through all)
    with BuildSketch(Plane.XY.offset(25.4)):
        with Locations((17.501031657, 6.604)):
            Circle(SKETCH4_R)
        with Locations((45.899094971, 6.604)):
            Circle(SKETCH4_R)
        with Locations((31.661531657, 34.925)):
            Circle(SKETCH4_R)
        with Locations((60.059594971, 34.925)):
            Circle(SKETCH4_R)
        with Locations((166.949905286, 305.501747258)):
            Circle(SKETCH4_R)
        with Locations((178.309130612, 328.22019791)):
            Circle(SKETCH4_R)
        with Locations((192.349905286, 305.501747258)):
            Circle(SKETCH4_R)
    extrude(amount=-CUT_EXTRUDE3_DEPTH, mode=Mode.SUBTRACT)


solid = part.part
